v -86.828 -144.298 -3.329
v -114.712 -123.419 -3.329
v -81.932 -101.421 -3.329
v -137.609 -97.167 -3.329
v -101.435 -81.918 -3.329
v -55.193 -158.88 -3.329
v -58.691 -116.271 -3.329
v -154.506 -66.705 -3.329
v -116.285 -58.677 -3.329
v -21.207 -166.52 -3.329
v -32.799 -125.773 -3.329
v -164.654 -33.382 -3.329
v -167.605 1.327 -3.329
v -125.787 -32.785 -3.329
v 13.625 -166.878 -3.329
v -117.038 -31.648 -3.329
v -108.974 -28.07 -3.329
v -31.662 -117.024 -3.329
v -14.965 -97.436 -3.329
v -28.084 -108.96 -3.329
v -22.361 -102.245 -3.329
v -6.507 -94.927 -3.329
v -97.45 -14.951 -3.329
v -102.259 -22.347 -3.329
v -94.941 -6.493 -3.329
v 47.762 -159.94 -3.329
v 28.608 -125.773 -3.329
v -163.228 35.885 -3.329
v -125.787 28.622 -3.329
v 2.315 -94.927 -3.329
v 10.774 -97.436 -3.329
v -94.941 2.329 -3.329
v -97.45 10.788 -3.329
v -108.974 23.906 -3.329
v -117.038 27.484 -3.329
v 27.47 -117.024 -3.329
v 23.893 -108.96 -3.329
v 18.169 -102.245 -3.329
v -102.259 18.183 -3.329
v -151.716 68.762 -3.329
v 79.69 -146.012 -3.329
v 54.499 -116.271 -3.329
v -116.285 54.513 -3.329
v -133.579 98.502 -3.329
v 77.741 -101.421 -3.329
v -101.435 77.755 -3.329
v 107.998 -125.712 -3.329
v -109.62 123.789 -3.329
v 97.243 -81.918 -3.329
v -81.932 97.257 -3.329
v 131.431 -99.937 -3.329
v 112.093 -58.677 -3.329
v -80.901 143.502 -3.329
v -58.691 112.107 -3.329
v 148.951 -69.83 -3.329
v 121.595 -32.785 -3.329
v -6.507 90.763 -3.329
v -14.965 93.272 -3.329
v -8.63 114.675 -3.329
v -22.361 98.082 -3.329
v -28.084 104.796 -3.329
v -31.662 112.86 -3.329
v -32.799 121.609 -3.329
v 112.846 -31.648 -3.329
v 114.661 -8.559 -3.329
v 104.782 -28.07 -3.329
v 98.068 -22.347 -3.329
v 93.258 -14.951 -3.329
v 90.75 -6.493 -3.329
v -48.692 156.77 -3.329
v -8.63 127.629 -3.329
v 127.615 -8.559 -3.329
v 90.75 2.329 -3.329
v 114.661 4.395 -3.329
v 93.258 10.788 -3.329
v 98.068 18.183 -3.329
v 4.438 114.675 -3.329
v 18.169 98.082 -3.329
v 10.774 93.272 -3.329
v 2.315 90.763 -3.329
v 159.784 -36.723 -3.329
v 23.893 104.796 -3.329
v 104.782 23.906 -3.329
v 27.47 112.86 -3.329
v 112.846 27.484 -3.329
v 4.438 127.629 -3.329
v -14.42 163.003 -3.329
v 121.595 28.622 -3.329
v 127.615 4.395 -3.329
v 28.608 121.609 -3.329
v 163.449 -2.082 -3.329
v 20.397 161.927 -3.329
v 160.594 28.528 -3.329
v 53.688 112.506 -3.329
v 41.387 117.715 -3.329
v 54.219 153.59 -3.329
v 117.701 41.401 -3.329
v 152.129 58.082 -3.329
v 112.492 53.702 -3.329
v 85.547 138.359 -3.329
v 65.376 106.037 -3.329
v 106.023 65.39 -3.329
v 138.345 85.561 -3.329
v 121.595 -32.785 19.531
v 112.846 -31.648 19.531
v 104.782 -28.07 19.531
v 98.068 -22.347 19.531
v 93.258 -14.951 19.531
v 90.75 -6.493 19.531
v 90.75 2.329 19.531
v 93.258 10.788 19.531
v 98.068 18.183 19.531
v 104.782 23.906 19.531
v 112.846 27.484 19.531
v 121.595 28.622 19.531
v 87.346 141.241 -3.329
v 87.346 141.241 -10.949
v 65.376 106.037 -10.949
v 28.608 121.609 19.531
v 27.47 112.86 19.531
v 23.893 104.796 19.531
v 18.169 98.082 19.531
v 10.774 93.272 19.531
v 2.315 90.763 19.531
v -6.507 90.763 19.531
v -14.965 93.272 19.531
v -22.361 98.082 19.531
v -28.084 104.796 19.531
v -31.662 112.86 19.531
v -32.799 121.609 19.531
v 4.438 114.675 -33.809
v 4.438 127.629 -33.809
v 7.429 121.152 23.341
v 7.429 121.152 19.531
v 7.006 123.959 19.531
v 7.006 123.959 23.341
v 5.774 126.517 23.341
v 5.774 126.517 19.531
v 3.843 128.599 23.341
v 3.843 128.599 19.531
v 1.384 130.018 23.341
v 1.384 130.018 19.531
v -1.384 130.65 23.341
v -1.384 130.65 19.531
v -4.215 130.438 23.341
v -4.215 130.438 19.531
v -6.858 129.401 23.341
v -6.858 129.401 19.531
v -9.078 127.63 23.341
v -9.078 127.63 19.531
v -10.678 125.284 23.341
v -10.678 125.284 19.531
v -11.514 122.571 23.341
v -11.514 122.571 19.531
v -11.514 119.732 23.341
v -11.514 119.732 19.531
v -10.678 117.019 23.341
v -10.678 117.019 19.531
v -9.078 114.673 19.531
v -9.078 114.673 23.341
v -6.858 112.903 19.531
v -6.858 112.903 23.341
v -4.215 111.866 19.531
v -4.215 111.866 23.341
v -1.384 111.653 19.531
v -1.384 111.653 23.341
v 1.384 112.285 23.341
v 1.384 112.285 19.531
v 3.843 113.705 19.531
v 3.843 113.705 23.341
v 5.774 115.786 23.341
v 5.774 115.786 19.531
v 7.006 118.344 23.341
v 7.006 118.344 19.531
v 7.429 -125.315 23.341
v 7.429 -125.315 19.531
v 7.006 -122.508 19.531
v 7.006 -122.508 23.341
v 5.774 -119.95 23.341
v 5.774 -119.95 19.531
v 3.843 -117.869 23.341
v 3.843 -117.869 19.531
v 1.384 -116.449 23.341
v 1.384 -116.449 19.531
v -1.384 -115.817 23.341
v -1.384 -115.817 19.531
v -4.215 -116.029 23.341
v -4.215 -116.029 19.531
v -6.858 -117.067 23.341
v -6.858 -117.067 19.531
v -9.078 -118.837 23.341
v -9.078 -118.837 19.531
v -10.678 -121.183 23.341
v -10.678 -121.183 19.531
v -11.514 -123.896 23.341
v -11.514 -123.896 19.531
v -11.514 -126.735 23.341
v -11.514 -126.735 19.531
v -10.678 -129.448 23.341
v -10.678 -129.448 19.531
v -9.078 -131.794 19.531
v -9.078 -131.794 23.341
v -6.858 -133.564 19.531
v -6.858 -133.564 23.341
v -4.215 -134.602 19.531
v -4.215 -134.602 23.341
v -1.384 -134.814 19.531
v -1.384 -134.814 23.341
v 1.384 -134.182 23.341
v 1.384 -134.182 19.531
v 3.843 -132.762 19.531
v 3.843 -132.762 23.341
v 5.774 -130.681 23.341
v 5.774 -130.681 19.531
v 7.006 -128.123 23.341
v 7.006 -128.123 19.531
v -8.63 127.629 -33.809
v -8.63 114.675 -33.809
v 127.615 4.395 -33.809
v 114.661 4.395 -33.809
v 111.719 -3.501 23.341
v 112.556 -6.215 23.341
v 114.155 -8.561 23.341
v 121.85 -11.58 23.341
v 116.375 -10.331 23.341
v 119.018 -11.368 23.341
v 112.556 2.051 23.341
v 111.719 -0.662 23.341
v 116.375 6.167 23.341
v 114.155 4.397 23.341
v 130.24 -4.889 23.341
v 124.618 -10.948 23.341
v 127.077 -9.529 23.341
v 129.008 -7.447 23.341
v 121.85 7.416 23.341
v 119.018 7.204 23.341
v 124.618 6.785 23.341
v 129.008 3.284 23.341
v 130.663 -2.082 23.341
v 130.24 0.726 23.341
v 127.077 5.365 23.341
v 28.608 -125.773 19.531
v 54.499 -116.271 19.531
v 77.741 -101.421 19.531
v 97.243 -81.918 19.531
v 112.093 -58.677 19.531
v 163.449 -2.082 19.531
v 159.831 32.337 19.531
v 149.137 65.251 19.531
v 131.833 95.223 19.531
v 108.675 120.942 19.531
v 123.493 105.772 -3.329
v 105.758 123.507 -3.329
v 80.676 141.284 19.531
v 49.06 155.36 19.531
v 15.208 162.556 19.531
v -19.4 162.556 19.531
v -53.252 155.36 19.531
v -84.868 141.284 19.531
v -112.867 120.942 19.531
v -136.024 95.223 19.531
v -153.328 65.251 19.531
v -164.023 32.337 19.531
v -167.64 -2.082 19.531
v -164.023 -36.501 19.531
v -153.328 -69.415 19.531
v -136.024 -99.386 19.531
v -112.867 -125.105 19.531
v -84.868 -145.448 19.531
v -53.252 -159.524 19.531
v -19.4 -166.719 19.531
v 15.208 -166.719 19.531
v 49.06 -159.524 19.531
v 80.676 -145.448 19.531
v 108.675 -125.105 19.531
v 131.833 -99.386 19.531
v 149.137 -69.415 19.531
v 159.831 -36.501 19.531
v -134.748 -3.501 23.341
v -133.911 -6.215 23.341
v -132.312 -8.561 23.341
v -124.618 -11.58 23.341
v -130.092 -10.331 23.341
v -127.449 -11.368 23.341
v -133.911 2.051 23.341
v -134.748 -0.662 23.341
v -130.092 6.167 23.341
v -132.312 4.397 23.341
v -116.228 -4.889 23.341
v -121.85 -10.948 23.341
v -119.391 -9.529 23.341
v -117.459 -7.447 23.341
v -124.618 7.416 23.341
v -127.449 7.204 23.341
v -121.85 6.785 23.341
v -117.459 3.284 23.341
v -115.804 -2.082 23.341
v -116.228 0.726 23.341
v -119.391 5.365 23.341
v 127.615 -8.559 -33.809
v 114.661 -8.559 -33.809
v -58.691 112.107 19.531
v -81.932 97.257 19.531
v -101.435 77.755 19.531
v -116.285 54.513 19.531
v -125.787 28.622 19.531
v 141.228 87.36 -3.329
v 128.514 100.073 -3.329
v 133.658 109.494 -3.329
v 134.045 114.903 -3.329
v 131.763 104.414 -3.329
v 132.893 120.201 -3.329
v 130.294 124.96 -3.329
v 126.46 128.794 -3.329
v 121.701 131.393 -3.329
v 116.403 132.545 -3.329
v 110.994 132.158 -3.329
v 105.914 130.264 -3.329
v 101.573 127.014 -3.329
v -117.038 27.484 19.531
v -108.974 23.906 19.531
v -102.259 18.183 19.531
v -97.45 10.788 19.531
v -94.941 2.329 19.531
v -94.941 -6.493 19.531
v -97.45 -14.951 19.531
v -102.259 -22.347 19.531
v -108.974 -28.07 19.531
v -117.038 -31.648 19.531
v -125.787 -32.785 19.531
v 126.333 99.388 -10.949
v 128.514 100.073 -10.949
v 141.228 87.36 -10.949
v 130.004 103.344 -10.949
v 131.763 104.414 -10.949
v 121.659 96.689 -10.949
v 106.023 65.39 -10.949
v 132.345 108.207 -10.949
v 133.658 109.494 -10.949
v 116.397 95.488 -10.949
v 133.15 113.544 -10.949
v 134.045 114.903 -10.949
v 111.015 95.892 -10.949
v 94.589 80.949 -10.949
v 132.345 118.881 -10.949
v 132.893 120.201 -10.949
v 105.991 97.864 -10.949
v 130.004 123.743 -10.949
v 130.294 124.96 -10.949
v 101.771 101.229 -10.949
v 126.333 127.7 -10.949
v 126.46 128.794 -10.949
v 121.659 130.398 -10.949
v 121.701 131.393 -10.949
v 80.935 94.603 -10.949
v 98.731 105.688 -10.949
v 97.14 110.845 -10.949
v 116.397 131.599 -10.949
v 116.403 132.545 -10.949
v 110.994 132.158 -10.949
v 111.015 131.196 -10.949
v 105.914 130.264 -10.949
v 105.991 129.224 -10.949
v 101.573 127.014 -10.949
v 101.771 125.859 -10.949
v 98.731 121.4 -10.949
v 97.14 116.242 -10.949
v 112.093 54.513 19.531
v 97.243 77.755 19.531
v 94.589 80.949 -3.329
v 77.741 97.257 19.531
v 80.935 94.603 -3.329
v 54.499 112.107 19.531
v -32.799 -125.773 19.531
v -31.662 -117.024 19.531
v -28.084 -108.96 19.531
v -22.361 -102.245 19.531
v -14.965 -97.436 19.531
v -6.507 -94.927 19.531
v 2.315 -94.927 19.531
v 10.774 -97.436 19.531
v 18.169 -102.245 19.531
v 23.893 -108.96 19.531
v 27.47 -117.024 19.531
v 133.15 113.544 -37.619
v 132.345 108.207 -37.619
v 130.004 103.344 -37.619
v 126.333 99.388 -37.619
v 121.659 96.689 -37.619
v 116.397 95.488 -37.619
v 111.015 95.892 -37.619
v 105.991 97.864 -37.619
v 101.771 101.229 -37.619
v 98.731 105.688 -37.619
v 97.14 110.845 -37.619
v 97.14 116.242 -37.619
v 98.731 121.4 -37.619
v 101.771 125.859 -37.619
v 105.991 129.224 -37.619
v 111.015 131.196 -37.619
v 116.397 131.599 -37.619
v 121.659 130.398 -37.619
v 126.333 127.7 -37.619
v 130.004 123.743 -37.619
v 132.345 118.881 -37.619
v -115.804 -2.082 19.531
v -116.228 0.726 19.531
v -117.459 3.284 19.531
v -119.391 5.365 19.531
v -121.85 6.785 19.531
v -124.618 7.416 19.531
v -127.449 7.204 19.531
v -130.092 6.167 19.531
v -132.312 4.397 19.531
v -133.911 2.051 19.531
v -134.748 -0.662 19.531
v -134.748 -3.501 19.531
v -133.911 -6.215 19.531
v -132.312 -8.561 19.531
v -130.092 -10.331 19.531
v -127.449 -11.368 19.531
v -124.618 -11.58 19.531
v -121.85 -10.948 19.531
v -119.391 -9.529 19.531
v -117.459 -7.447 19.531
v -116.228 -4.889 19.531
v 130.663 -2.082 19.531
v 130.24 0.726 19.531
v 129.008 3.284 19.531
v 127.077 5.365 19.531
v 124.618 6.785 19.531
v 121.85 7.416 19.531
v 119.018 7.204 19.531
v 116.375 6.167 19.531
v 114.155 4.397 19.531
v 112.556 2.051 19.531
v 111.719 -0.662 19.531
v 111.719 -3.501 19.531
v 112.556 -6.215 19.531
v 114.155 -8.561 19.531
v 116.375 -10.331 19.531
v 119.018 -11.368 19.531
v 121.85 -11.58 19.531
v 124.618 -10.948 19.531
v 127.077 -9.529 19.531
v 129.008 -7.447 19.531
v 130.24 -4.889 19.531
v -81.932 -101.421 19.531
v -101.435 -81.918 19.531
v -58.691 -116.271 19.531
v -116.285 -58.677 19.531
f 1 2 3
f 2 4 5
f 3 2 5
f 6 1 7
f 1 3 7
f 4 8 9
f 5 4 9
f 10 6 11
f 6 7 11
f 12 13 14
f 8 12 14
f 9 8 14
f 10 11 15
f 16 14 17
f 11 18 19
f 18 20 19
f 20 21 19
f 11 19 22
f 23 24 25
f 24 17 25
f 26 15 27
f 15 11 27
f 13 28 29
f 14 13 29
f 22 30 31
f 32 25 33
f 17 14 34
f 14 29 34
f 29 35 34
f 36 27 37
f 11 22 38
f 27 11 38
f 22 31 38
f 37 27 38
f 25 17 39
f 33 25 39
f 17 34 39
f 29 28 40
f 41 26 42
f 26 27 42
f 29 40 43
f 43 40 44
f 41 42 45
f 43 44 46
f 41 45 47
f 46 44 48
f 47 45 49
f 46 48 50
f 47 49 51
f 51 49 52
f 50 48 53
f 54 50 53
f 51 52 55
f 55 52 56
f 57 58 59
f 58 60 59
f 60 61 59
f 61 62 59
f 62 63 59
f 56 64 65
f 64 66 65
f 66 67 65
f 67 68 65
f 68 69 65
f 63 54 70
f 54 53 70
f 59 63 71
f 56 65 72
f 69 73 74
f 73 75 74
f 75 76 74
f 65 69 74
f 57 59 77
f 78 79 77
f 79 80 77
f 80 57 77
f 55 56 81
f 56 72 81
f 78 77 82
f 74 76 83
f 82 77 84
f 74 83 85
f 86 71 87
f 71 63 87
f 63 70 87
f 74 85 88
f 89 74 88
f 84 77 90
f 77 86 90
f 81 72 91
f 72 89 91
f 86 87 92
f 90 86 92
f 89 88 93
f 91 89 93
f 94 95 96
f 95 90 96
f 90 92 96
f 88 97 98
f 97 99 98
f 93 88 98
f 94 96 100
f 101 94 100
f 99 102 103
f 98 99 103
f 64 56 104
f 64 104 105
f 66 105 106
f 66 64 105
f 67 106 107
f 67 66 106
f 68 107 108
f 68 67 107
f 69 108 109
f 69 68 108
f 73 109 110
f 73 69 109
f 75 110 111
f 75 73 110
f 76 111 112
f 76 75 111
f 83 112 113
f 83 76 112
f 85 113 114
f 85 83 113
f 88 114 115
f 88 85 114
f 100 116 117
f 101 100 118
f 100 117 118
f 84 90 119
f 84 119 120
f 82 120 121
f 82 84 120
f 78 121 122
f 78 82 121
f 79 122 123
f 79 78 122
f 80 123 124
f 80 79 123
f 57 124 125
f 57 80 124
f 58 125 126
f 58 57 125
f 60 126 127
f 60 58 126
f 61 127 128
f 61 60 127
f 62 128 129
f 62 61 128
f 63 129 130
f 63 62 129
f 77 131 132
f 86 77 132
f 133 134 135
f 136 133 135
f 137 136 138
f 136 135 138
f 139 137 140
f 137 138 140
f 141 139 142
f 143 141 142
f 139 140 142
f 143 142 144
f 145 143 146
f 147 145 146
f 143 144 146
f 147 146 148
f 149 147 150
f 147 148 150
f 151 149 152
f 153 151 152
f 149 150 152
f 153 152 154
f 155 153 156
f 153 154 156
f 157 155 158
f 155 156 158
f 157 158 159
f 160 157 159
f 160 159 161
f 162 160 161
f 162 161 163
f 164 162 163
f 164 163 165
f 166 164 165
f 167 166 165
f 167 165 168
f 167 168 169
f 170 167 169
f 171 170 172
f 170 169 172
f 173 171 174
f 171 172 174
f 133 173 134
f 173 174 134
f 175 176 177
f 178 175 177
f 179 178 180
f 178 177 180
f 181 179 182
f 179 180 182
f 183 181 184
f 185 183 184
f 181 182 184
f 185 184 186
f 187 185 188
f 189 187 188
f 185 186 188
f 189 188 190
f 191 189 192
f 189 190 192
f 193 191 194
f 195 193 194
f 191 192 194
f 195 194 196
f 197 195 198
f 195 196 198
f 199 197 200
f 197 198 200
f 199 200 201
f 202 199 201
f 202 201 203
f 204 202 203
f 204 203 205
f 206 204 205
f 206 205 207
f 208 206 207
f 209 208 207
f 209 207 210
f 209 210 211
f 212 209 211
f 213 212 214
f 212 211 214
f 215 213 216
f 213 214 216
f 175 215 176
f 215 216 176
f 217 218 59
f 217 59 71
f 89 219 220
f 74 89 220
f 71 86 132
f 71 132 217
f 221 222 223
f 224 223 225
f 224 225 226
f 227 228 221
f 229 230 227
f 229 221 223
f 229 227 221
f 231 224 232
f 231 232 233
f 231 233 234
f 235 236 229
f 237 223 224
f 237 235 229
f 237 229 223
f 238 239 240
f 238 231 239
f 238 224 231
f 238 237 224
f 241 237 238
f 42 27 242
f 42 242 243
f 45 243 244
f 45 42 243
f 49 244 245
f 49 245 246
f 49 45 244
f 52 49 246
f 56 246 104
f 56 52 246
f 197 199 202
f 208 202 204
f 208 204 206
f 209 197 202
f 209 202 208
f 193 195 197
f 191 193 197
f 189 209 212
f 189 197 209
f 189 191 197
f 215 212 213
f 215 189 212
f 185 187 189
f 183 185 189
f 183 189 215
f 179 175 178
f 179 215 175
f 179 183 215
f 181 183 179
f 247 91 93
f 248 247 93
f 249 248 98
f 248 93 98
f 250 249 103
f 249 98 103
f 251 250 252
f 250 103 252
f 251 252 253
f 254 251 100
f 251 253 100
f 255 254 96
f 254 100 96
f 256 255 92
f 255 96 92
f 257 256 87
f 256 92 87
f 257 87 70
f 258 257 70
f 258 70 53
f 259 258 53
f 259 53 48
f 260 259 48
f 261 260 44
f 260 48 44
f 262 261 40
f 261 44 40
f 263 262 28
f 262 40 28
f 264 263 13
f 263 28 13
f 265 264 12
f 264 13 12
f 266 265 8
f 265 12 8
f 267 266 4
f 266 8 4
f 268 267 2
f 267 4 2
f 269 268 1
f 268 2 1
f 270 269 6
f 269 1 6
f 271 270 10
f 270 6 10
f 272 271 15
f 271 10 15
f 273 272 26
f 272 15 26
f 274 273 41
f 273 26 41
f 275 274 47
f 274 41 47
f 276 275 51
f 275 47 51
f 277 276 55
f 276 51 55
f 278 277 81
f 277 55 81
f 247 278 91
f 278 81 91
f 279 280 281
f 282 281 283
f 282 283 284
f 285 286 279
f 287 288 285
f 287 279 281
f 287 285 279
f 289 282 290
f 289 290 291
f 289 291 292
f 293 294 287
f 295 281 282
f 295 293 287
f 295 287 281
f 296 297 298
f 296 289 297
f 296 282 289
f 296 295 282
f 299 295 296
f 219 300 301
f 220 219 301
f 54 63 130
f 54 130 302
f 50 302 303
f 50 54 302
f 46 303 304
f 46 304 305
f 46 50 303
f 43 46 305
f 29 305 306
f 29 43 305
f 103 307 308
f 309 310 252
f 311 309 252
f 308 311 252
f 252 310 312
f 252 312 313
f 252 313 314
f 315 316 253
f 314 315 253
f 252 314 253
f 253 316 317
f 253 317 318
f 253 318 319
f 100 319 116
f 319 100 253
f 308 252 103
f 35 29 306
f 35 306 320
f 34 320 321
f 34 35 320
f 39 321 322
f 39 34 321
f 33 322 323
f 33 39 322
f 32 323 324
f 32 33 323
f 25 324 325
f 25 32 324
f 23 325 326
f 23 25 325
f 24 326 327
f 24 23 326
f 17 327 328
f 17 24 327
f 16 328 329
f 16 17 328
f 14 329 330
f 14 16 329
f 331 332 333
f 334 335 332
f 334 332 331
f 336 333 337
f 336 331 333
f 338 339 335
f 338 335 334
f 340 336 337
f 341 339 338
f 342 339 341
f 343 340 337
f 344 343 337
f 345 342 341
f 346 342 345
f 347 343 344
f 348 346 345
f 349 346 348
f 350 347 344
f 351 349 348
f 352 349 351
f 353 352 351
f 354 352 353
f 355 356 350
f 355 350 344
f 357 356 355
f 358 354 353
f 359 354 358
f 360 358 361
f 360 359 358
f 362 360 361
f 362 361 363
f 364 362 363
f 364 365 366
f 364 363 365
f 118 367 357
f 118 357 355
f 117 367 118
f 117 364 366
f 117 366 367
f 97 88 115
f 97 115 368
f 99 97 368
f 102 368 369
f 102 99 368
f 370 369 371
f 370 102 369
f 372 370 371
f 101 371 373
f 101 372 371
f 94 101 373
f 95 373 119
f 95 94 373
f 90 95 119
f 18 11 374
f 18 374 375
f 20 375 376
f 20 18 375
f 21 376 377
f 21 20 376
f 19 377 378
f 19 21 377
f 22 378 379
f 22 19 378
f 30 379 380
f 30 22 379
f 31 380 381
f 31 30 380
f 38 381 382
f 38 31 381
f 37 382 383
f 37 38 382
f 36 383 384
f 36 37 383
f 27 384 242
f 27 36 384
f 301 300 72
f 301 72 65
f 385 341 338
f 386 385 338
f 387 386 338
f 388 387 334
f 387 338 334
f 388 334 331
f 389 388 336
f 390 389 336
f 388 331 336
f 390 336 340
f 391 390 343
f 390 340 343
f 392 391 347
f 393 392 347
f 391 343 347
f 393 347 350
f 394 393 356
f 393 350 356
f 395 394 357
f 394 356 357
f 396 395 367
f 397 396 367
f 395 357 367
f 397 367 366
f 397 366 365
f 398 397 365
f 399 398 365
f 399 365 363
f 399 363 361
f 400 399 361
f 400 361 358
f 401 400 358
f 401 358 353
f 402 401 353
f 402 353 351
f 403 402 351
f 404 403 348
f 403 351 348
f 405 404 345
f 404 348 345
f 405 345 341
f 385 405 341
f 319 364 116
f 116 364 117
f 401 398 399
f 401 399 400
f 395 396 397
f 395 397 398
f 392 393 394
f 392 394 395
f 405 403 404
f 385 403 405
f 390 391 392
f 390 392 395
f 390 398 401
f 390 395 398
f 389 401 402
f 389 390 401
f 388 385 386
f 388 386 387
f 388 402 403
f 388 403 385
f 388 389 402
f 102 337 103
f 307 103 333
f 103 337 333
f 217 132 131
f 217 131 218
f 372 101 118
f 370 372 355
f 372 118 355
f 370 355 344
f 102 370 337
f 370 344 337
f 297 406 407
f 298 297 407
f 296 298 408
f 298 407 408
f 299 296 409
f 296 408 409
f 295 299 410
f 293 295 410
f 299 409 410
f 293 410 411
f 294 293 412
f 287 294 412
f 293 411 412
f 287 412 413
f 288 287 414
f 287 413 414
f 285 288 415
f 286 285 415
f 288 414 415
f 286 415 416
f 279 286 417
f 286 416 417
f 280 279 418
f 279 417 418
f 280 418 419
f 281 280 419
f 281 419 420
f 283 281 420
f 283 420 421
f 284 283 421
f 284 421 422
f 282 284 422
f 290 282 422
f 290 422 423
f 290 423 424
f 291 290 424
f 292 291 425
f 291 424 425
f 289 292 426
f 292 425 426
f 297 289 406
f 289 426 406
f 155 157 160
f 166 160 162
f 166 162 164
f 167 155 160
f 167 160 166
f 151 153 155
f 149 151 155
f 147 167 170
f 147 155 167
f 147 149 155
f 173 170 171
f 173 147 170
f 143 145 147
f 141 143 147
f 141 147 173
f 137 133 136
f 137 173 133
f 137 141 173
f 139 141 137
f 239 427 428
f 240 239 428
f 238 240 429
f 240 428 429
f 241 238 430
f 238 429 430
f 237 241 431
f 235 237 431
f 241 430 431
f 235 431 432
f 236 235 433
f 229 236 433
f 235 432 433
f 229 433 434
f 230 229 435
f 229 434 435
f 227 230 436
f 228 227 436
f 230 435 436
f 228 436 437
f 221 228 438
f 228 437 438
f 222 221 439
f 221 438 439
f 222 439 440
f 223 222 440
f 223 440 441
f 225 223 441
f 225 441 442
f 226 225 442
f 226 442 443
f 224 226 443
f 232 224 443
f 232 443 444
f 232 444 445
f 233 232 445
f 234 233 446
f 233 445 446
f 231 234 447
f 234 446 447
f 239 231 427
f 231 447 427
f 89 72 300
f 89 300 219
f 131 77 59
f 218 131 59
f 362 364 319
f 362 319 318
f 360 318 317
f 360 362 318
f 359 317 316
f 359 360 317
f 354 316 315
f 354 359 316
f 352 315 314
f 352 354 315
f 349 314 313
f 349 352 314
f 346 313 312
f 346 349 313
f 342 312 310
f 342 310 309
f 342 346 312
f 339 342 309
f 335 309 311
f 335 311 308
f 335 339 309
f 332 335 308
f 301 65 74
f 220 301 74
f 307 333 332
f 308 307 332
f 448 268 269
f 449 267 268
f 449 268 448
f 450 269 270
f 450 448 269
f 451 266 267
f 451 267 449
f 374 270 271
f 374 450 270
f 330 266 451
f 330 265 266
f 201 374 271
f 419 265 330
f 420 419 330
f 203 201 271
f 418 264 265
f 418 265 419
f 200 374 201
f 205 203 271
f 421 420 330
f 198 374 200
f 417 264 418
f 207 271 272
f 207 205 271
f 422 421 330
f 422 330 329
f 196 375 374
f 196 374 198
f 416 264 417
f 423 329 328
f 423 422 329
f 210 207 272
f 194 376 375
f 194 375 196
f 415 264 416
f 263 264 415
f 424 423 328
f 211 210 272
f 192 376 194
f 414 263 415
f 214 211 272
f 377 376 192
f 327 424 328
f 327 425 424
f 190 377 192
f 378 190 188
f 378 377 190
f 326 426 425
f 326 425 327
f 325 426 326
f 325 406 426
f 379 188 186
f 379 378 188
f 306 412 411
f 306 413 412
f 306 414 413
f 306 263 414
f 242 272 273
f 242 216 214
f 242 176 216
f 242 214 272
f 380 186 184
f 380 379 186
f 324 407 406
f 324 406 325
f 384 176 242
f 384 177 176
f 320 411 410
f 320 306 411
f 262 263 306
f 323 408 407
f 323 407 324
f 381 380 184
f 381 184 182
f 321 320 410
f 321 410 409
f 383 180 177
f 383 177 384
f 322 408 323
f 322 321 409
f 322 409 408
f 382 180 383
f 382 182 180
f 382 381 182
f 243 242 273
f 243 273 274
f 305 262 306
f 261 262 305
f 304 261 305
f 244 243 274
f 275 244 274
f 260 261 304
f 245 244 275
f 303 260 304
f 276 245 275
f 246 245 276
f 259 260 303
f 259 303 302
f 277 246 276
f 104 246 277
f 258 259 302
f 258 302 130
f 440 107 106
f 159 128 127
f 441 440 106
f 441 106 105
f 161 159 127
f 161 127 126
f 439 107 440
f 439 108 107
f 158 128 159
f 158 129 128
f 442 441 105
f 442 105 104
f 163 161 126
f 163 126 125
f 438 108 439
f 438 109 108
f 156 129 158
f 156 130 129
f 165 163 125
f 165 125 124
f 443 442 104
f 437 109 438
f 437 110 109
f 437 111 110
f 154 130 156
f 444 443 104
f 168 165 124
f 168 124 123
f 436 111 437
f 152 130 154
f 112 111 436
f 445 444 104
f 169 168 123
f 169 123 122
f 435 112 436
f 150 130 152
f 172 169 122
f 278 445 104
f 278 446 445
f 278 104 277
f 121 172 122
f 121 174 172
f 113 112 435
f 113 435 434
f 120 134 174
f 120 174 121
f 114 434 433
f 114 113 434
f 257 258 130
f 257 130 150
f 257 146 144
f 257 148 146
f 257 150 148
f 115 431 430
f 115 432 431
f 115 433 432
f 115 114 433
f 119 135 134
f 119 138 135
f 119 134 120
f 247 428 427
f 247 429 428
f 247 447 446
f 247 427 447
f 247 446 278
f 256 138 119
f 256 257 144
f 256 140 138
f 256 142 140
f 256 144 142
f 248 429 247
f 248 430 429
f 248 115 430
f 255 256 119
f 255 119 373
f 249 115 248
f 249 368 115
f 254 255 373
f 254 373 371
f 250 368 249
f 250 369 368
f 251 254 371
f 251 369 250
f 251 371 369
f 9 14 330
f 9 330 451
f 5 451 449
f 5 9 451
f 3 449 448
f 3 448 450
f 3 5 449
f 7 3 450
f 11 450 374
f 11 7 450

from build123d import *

# Parameters (mm, degrees)
SKETCH1_R           = 110.363
BOSS_EXTRUDE1_DEPTH = 15.24
SKETCH2_R           = 6.35
BOSS_EXTRUDE2_DEPTH = 2.54
SKETCH3_W           = 8.636
SKETCH3_H           = 8.636
BOSS_EXTRUDE3_DEPTH = 20.32
SKETCH4_W           = 8.7122
SKETCH4_H           = 8.636
BOSS_EXTRUDE4_DEPTH = 20.32
BOSS_EXTRUDE5_START = 5.08
BOSS_EXTRUDE5_DEPTH = 5.08
BOSS_EXTRUDE6_DEPTH = 5.08
SKETCH7_R           = 12.070643518
BOSS_EXTRUDE7_DEPTH = 17.78
SCALE2_SCALE        = 1.5


with BuildPart() as part:
    # Sketch1 → Boss-Extrude1 (new body)
    with BuildSketch(Plane.XY):
        Circle(SKETCH1_R)
        with BuildLine():
            ThreePointArc((-20.468919413, 82.460503922), (-60.07791345, 60.07791345), (-82.460503922, 20.468919413))
            ThreePointArc((-82.460503922, 20.468919413), (-61.684540449, 0), (-82.460503922, -20.468919413))
            ThreePointArc((-82.460503922, -20.468919413), (-60.07791345, -60.07791345), (-20.468919413, -82.460503922))
            ThreePointArc((-20.468919413, -82.460503922), (0, -61.684540449), (20.468919413, -82.460503922))
            ThreePointArc((20.468919413, -82.460503922), (60.07791345, -60.07791345), (82.460503922, -20.468919413))
            ThreePointArc((82.460503922, -20.468919413), (61.684540449, 0), (82.460503922, 20.468919413))
            ThreePointArc((82.460503922, 20.468919413), (60.07791345, 60.07791345), (20.468919413, 82.460503922))
            ThreePointArc((20.468919413, 82.460503922), (0, 61.684540449), (-20.468919413, 82.460503922))
        make_face(mode=Mode.SUBTRACT)
    extrude(amount=BOSS_EXTRUDE1_DEPTH)

    # Sketch2 → Boss-Extrude2 (add)
    with BuildSketch(Plane.XY.offset(15.24)):
        with Locations((0, 82.155728736)):
            Circle(SKETCH2_R)
        with Locations((82.155728736, 0)):
            Circle(SKETCH2_R)
        with Locations((0, -82.155728736)):
            Circle(SKETCH2_R)
        with Locations((-82.155728736, 0)):
            Circle(SKETCH2_R)
    extrude(amount=BOSS_EXTRUDE2_DEPTH)

    # Sketch3 → Boss-Extrude3 (add)
    with BuildSketch(Plane(origin=(0, 0, 0), x_dir=(-1, 0, 0), z_dir=(0, 0, -1))):
        with Locations((-82.155728736, 0)):
            Rectangle(SKETCH3_W, SKETCH3_H)
    extrude(amount=BOSS_EXTRUDE3_DEPTH)

    # Sketch4 → Boss-Extrude4 (add)
    with BuildSketch(Plane(origin=(0, 0, 0), x_dir=(-1, 0, 0), z_dir=(0, 0, -1))):
        with Locations((0, 82.155728736)):
            Rectangle(SKETCH4_W, SKETCH4_H)
    extrude(amount=BOSS_EXTRUDE4_DEPTH)

    # Sketch5 → Boss-Extrude5 (add)
    with BuildSketch(Plane(origin=(0, 0, 0), x_dir=(-1, 0, 0), z_dir=(0, 0, -1)).offset(BOSS_EXTRUDE5_START)):
        with BuildLine():
            Line((-72.079043308, 44.981361527), (-95.54887759, 59.627853106))
            Line((-95.54887759, 59.627853106), (-59.627853106, 95.54887759))
            Line((-59.627853106, 95.54887759), (-44.981361527, 72.079043308))
            ThreePointArc((-44.981361527, 72.079043308), (-60.07791345, 60.07791345), (-72.079043308, 44.981361527))
        make_face()
    extrude(amount=-BOSS_EXTRUDE5_DEPTH)

    # Sketch6 → Boss-Extrude6 (add)
    with BuildSketch(Plane(origin=(0, 0, -5.08), x_dir=(-1, 0, 0), z_dir=(0, 0, -1))):
        with BuildLine():
            Line((-87.073217452, 68.103513244), (-69.11270521, 86.064025486))
            ThreePointArc((-69.11270521, 86.064025486), (-87.073217452, 86.064025486), (-87.073217452, 68.103513244))
        make_face()
    extrude(amount=-BOSS_EXTRUDE6_DEPTH)

    # Sketch7 → Boss-Extrude7 (add)
    with BuildSketch(Plane(origin=(0, 0, -5.08), x_dir=(-1, 0, 0), z_dir=(0, 0, -1))):
        with Locations(Location((-78.092961331, 77.083769365, 0), (0, 0, 180))):
            Circle(SKETCH7_R)
    extrude(amount=BOSS_EXTRUDE7_DEPTH)


with BuildPart() as part_1:
    # Scale2: scaled about (4.191580163, 4.163736675, 6.658412252)
    add(part.part.scale(SCALE2_SCALE).moved(Location((-2.095790082, -2.081868337, -3.329206126))))


solid = part_1.part
